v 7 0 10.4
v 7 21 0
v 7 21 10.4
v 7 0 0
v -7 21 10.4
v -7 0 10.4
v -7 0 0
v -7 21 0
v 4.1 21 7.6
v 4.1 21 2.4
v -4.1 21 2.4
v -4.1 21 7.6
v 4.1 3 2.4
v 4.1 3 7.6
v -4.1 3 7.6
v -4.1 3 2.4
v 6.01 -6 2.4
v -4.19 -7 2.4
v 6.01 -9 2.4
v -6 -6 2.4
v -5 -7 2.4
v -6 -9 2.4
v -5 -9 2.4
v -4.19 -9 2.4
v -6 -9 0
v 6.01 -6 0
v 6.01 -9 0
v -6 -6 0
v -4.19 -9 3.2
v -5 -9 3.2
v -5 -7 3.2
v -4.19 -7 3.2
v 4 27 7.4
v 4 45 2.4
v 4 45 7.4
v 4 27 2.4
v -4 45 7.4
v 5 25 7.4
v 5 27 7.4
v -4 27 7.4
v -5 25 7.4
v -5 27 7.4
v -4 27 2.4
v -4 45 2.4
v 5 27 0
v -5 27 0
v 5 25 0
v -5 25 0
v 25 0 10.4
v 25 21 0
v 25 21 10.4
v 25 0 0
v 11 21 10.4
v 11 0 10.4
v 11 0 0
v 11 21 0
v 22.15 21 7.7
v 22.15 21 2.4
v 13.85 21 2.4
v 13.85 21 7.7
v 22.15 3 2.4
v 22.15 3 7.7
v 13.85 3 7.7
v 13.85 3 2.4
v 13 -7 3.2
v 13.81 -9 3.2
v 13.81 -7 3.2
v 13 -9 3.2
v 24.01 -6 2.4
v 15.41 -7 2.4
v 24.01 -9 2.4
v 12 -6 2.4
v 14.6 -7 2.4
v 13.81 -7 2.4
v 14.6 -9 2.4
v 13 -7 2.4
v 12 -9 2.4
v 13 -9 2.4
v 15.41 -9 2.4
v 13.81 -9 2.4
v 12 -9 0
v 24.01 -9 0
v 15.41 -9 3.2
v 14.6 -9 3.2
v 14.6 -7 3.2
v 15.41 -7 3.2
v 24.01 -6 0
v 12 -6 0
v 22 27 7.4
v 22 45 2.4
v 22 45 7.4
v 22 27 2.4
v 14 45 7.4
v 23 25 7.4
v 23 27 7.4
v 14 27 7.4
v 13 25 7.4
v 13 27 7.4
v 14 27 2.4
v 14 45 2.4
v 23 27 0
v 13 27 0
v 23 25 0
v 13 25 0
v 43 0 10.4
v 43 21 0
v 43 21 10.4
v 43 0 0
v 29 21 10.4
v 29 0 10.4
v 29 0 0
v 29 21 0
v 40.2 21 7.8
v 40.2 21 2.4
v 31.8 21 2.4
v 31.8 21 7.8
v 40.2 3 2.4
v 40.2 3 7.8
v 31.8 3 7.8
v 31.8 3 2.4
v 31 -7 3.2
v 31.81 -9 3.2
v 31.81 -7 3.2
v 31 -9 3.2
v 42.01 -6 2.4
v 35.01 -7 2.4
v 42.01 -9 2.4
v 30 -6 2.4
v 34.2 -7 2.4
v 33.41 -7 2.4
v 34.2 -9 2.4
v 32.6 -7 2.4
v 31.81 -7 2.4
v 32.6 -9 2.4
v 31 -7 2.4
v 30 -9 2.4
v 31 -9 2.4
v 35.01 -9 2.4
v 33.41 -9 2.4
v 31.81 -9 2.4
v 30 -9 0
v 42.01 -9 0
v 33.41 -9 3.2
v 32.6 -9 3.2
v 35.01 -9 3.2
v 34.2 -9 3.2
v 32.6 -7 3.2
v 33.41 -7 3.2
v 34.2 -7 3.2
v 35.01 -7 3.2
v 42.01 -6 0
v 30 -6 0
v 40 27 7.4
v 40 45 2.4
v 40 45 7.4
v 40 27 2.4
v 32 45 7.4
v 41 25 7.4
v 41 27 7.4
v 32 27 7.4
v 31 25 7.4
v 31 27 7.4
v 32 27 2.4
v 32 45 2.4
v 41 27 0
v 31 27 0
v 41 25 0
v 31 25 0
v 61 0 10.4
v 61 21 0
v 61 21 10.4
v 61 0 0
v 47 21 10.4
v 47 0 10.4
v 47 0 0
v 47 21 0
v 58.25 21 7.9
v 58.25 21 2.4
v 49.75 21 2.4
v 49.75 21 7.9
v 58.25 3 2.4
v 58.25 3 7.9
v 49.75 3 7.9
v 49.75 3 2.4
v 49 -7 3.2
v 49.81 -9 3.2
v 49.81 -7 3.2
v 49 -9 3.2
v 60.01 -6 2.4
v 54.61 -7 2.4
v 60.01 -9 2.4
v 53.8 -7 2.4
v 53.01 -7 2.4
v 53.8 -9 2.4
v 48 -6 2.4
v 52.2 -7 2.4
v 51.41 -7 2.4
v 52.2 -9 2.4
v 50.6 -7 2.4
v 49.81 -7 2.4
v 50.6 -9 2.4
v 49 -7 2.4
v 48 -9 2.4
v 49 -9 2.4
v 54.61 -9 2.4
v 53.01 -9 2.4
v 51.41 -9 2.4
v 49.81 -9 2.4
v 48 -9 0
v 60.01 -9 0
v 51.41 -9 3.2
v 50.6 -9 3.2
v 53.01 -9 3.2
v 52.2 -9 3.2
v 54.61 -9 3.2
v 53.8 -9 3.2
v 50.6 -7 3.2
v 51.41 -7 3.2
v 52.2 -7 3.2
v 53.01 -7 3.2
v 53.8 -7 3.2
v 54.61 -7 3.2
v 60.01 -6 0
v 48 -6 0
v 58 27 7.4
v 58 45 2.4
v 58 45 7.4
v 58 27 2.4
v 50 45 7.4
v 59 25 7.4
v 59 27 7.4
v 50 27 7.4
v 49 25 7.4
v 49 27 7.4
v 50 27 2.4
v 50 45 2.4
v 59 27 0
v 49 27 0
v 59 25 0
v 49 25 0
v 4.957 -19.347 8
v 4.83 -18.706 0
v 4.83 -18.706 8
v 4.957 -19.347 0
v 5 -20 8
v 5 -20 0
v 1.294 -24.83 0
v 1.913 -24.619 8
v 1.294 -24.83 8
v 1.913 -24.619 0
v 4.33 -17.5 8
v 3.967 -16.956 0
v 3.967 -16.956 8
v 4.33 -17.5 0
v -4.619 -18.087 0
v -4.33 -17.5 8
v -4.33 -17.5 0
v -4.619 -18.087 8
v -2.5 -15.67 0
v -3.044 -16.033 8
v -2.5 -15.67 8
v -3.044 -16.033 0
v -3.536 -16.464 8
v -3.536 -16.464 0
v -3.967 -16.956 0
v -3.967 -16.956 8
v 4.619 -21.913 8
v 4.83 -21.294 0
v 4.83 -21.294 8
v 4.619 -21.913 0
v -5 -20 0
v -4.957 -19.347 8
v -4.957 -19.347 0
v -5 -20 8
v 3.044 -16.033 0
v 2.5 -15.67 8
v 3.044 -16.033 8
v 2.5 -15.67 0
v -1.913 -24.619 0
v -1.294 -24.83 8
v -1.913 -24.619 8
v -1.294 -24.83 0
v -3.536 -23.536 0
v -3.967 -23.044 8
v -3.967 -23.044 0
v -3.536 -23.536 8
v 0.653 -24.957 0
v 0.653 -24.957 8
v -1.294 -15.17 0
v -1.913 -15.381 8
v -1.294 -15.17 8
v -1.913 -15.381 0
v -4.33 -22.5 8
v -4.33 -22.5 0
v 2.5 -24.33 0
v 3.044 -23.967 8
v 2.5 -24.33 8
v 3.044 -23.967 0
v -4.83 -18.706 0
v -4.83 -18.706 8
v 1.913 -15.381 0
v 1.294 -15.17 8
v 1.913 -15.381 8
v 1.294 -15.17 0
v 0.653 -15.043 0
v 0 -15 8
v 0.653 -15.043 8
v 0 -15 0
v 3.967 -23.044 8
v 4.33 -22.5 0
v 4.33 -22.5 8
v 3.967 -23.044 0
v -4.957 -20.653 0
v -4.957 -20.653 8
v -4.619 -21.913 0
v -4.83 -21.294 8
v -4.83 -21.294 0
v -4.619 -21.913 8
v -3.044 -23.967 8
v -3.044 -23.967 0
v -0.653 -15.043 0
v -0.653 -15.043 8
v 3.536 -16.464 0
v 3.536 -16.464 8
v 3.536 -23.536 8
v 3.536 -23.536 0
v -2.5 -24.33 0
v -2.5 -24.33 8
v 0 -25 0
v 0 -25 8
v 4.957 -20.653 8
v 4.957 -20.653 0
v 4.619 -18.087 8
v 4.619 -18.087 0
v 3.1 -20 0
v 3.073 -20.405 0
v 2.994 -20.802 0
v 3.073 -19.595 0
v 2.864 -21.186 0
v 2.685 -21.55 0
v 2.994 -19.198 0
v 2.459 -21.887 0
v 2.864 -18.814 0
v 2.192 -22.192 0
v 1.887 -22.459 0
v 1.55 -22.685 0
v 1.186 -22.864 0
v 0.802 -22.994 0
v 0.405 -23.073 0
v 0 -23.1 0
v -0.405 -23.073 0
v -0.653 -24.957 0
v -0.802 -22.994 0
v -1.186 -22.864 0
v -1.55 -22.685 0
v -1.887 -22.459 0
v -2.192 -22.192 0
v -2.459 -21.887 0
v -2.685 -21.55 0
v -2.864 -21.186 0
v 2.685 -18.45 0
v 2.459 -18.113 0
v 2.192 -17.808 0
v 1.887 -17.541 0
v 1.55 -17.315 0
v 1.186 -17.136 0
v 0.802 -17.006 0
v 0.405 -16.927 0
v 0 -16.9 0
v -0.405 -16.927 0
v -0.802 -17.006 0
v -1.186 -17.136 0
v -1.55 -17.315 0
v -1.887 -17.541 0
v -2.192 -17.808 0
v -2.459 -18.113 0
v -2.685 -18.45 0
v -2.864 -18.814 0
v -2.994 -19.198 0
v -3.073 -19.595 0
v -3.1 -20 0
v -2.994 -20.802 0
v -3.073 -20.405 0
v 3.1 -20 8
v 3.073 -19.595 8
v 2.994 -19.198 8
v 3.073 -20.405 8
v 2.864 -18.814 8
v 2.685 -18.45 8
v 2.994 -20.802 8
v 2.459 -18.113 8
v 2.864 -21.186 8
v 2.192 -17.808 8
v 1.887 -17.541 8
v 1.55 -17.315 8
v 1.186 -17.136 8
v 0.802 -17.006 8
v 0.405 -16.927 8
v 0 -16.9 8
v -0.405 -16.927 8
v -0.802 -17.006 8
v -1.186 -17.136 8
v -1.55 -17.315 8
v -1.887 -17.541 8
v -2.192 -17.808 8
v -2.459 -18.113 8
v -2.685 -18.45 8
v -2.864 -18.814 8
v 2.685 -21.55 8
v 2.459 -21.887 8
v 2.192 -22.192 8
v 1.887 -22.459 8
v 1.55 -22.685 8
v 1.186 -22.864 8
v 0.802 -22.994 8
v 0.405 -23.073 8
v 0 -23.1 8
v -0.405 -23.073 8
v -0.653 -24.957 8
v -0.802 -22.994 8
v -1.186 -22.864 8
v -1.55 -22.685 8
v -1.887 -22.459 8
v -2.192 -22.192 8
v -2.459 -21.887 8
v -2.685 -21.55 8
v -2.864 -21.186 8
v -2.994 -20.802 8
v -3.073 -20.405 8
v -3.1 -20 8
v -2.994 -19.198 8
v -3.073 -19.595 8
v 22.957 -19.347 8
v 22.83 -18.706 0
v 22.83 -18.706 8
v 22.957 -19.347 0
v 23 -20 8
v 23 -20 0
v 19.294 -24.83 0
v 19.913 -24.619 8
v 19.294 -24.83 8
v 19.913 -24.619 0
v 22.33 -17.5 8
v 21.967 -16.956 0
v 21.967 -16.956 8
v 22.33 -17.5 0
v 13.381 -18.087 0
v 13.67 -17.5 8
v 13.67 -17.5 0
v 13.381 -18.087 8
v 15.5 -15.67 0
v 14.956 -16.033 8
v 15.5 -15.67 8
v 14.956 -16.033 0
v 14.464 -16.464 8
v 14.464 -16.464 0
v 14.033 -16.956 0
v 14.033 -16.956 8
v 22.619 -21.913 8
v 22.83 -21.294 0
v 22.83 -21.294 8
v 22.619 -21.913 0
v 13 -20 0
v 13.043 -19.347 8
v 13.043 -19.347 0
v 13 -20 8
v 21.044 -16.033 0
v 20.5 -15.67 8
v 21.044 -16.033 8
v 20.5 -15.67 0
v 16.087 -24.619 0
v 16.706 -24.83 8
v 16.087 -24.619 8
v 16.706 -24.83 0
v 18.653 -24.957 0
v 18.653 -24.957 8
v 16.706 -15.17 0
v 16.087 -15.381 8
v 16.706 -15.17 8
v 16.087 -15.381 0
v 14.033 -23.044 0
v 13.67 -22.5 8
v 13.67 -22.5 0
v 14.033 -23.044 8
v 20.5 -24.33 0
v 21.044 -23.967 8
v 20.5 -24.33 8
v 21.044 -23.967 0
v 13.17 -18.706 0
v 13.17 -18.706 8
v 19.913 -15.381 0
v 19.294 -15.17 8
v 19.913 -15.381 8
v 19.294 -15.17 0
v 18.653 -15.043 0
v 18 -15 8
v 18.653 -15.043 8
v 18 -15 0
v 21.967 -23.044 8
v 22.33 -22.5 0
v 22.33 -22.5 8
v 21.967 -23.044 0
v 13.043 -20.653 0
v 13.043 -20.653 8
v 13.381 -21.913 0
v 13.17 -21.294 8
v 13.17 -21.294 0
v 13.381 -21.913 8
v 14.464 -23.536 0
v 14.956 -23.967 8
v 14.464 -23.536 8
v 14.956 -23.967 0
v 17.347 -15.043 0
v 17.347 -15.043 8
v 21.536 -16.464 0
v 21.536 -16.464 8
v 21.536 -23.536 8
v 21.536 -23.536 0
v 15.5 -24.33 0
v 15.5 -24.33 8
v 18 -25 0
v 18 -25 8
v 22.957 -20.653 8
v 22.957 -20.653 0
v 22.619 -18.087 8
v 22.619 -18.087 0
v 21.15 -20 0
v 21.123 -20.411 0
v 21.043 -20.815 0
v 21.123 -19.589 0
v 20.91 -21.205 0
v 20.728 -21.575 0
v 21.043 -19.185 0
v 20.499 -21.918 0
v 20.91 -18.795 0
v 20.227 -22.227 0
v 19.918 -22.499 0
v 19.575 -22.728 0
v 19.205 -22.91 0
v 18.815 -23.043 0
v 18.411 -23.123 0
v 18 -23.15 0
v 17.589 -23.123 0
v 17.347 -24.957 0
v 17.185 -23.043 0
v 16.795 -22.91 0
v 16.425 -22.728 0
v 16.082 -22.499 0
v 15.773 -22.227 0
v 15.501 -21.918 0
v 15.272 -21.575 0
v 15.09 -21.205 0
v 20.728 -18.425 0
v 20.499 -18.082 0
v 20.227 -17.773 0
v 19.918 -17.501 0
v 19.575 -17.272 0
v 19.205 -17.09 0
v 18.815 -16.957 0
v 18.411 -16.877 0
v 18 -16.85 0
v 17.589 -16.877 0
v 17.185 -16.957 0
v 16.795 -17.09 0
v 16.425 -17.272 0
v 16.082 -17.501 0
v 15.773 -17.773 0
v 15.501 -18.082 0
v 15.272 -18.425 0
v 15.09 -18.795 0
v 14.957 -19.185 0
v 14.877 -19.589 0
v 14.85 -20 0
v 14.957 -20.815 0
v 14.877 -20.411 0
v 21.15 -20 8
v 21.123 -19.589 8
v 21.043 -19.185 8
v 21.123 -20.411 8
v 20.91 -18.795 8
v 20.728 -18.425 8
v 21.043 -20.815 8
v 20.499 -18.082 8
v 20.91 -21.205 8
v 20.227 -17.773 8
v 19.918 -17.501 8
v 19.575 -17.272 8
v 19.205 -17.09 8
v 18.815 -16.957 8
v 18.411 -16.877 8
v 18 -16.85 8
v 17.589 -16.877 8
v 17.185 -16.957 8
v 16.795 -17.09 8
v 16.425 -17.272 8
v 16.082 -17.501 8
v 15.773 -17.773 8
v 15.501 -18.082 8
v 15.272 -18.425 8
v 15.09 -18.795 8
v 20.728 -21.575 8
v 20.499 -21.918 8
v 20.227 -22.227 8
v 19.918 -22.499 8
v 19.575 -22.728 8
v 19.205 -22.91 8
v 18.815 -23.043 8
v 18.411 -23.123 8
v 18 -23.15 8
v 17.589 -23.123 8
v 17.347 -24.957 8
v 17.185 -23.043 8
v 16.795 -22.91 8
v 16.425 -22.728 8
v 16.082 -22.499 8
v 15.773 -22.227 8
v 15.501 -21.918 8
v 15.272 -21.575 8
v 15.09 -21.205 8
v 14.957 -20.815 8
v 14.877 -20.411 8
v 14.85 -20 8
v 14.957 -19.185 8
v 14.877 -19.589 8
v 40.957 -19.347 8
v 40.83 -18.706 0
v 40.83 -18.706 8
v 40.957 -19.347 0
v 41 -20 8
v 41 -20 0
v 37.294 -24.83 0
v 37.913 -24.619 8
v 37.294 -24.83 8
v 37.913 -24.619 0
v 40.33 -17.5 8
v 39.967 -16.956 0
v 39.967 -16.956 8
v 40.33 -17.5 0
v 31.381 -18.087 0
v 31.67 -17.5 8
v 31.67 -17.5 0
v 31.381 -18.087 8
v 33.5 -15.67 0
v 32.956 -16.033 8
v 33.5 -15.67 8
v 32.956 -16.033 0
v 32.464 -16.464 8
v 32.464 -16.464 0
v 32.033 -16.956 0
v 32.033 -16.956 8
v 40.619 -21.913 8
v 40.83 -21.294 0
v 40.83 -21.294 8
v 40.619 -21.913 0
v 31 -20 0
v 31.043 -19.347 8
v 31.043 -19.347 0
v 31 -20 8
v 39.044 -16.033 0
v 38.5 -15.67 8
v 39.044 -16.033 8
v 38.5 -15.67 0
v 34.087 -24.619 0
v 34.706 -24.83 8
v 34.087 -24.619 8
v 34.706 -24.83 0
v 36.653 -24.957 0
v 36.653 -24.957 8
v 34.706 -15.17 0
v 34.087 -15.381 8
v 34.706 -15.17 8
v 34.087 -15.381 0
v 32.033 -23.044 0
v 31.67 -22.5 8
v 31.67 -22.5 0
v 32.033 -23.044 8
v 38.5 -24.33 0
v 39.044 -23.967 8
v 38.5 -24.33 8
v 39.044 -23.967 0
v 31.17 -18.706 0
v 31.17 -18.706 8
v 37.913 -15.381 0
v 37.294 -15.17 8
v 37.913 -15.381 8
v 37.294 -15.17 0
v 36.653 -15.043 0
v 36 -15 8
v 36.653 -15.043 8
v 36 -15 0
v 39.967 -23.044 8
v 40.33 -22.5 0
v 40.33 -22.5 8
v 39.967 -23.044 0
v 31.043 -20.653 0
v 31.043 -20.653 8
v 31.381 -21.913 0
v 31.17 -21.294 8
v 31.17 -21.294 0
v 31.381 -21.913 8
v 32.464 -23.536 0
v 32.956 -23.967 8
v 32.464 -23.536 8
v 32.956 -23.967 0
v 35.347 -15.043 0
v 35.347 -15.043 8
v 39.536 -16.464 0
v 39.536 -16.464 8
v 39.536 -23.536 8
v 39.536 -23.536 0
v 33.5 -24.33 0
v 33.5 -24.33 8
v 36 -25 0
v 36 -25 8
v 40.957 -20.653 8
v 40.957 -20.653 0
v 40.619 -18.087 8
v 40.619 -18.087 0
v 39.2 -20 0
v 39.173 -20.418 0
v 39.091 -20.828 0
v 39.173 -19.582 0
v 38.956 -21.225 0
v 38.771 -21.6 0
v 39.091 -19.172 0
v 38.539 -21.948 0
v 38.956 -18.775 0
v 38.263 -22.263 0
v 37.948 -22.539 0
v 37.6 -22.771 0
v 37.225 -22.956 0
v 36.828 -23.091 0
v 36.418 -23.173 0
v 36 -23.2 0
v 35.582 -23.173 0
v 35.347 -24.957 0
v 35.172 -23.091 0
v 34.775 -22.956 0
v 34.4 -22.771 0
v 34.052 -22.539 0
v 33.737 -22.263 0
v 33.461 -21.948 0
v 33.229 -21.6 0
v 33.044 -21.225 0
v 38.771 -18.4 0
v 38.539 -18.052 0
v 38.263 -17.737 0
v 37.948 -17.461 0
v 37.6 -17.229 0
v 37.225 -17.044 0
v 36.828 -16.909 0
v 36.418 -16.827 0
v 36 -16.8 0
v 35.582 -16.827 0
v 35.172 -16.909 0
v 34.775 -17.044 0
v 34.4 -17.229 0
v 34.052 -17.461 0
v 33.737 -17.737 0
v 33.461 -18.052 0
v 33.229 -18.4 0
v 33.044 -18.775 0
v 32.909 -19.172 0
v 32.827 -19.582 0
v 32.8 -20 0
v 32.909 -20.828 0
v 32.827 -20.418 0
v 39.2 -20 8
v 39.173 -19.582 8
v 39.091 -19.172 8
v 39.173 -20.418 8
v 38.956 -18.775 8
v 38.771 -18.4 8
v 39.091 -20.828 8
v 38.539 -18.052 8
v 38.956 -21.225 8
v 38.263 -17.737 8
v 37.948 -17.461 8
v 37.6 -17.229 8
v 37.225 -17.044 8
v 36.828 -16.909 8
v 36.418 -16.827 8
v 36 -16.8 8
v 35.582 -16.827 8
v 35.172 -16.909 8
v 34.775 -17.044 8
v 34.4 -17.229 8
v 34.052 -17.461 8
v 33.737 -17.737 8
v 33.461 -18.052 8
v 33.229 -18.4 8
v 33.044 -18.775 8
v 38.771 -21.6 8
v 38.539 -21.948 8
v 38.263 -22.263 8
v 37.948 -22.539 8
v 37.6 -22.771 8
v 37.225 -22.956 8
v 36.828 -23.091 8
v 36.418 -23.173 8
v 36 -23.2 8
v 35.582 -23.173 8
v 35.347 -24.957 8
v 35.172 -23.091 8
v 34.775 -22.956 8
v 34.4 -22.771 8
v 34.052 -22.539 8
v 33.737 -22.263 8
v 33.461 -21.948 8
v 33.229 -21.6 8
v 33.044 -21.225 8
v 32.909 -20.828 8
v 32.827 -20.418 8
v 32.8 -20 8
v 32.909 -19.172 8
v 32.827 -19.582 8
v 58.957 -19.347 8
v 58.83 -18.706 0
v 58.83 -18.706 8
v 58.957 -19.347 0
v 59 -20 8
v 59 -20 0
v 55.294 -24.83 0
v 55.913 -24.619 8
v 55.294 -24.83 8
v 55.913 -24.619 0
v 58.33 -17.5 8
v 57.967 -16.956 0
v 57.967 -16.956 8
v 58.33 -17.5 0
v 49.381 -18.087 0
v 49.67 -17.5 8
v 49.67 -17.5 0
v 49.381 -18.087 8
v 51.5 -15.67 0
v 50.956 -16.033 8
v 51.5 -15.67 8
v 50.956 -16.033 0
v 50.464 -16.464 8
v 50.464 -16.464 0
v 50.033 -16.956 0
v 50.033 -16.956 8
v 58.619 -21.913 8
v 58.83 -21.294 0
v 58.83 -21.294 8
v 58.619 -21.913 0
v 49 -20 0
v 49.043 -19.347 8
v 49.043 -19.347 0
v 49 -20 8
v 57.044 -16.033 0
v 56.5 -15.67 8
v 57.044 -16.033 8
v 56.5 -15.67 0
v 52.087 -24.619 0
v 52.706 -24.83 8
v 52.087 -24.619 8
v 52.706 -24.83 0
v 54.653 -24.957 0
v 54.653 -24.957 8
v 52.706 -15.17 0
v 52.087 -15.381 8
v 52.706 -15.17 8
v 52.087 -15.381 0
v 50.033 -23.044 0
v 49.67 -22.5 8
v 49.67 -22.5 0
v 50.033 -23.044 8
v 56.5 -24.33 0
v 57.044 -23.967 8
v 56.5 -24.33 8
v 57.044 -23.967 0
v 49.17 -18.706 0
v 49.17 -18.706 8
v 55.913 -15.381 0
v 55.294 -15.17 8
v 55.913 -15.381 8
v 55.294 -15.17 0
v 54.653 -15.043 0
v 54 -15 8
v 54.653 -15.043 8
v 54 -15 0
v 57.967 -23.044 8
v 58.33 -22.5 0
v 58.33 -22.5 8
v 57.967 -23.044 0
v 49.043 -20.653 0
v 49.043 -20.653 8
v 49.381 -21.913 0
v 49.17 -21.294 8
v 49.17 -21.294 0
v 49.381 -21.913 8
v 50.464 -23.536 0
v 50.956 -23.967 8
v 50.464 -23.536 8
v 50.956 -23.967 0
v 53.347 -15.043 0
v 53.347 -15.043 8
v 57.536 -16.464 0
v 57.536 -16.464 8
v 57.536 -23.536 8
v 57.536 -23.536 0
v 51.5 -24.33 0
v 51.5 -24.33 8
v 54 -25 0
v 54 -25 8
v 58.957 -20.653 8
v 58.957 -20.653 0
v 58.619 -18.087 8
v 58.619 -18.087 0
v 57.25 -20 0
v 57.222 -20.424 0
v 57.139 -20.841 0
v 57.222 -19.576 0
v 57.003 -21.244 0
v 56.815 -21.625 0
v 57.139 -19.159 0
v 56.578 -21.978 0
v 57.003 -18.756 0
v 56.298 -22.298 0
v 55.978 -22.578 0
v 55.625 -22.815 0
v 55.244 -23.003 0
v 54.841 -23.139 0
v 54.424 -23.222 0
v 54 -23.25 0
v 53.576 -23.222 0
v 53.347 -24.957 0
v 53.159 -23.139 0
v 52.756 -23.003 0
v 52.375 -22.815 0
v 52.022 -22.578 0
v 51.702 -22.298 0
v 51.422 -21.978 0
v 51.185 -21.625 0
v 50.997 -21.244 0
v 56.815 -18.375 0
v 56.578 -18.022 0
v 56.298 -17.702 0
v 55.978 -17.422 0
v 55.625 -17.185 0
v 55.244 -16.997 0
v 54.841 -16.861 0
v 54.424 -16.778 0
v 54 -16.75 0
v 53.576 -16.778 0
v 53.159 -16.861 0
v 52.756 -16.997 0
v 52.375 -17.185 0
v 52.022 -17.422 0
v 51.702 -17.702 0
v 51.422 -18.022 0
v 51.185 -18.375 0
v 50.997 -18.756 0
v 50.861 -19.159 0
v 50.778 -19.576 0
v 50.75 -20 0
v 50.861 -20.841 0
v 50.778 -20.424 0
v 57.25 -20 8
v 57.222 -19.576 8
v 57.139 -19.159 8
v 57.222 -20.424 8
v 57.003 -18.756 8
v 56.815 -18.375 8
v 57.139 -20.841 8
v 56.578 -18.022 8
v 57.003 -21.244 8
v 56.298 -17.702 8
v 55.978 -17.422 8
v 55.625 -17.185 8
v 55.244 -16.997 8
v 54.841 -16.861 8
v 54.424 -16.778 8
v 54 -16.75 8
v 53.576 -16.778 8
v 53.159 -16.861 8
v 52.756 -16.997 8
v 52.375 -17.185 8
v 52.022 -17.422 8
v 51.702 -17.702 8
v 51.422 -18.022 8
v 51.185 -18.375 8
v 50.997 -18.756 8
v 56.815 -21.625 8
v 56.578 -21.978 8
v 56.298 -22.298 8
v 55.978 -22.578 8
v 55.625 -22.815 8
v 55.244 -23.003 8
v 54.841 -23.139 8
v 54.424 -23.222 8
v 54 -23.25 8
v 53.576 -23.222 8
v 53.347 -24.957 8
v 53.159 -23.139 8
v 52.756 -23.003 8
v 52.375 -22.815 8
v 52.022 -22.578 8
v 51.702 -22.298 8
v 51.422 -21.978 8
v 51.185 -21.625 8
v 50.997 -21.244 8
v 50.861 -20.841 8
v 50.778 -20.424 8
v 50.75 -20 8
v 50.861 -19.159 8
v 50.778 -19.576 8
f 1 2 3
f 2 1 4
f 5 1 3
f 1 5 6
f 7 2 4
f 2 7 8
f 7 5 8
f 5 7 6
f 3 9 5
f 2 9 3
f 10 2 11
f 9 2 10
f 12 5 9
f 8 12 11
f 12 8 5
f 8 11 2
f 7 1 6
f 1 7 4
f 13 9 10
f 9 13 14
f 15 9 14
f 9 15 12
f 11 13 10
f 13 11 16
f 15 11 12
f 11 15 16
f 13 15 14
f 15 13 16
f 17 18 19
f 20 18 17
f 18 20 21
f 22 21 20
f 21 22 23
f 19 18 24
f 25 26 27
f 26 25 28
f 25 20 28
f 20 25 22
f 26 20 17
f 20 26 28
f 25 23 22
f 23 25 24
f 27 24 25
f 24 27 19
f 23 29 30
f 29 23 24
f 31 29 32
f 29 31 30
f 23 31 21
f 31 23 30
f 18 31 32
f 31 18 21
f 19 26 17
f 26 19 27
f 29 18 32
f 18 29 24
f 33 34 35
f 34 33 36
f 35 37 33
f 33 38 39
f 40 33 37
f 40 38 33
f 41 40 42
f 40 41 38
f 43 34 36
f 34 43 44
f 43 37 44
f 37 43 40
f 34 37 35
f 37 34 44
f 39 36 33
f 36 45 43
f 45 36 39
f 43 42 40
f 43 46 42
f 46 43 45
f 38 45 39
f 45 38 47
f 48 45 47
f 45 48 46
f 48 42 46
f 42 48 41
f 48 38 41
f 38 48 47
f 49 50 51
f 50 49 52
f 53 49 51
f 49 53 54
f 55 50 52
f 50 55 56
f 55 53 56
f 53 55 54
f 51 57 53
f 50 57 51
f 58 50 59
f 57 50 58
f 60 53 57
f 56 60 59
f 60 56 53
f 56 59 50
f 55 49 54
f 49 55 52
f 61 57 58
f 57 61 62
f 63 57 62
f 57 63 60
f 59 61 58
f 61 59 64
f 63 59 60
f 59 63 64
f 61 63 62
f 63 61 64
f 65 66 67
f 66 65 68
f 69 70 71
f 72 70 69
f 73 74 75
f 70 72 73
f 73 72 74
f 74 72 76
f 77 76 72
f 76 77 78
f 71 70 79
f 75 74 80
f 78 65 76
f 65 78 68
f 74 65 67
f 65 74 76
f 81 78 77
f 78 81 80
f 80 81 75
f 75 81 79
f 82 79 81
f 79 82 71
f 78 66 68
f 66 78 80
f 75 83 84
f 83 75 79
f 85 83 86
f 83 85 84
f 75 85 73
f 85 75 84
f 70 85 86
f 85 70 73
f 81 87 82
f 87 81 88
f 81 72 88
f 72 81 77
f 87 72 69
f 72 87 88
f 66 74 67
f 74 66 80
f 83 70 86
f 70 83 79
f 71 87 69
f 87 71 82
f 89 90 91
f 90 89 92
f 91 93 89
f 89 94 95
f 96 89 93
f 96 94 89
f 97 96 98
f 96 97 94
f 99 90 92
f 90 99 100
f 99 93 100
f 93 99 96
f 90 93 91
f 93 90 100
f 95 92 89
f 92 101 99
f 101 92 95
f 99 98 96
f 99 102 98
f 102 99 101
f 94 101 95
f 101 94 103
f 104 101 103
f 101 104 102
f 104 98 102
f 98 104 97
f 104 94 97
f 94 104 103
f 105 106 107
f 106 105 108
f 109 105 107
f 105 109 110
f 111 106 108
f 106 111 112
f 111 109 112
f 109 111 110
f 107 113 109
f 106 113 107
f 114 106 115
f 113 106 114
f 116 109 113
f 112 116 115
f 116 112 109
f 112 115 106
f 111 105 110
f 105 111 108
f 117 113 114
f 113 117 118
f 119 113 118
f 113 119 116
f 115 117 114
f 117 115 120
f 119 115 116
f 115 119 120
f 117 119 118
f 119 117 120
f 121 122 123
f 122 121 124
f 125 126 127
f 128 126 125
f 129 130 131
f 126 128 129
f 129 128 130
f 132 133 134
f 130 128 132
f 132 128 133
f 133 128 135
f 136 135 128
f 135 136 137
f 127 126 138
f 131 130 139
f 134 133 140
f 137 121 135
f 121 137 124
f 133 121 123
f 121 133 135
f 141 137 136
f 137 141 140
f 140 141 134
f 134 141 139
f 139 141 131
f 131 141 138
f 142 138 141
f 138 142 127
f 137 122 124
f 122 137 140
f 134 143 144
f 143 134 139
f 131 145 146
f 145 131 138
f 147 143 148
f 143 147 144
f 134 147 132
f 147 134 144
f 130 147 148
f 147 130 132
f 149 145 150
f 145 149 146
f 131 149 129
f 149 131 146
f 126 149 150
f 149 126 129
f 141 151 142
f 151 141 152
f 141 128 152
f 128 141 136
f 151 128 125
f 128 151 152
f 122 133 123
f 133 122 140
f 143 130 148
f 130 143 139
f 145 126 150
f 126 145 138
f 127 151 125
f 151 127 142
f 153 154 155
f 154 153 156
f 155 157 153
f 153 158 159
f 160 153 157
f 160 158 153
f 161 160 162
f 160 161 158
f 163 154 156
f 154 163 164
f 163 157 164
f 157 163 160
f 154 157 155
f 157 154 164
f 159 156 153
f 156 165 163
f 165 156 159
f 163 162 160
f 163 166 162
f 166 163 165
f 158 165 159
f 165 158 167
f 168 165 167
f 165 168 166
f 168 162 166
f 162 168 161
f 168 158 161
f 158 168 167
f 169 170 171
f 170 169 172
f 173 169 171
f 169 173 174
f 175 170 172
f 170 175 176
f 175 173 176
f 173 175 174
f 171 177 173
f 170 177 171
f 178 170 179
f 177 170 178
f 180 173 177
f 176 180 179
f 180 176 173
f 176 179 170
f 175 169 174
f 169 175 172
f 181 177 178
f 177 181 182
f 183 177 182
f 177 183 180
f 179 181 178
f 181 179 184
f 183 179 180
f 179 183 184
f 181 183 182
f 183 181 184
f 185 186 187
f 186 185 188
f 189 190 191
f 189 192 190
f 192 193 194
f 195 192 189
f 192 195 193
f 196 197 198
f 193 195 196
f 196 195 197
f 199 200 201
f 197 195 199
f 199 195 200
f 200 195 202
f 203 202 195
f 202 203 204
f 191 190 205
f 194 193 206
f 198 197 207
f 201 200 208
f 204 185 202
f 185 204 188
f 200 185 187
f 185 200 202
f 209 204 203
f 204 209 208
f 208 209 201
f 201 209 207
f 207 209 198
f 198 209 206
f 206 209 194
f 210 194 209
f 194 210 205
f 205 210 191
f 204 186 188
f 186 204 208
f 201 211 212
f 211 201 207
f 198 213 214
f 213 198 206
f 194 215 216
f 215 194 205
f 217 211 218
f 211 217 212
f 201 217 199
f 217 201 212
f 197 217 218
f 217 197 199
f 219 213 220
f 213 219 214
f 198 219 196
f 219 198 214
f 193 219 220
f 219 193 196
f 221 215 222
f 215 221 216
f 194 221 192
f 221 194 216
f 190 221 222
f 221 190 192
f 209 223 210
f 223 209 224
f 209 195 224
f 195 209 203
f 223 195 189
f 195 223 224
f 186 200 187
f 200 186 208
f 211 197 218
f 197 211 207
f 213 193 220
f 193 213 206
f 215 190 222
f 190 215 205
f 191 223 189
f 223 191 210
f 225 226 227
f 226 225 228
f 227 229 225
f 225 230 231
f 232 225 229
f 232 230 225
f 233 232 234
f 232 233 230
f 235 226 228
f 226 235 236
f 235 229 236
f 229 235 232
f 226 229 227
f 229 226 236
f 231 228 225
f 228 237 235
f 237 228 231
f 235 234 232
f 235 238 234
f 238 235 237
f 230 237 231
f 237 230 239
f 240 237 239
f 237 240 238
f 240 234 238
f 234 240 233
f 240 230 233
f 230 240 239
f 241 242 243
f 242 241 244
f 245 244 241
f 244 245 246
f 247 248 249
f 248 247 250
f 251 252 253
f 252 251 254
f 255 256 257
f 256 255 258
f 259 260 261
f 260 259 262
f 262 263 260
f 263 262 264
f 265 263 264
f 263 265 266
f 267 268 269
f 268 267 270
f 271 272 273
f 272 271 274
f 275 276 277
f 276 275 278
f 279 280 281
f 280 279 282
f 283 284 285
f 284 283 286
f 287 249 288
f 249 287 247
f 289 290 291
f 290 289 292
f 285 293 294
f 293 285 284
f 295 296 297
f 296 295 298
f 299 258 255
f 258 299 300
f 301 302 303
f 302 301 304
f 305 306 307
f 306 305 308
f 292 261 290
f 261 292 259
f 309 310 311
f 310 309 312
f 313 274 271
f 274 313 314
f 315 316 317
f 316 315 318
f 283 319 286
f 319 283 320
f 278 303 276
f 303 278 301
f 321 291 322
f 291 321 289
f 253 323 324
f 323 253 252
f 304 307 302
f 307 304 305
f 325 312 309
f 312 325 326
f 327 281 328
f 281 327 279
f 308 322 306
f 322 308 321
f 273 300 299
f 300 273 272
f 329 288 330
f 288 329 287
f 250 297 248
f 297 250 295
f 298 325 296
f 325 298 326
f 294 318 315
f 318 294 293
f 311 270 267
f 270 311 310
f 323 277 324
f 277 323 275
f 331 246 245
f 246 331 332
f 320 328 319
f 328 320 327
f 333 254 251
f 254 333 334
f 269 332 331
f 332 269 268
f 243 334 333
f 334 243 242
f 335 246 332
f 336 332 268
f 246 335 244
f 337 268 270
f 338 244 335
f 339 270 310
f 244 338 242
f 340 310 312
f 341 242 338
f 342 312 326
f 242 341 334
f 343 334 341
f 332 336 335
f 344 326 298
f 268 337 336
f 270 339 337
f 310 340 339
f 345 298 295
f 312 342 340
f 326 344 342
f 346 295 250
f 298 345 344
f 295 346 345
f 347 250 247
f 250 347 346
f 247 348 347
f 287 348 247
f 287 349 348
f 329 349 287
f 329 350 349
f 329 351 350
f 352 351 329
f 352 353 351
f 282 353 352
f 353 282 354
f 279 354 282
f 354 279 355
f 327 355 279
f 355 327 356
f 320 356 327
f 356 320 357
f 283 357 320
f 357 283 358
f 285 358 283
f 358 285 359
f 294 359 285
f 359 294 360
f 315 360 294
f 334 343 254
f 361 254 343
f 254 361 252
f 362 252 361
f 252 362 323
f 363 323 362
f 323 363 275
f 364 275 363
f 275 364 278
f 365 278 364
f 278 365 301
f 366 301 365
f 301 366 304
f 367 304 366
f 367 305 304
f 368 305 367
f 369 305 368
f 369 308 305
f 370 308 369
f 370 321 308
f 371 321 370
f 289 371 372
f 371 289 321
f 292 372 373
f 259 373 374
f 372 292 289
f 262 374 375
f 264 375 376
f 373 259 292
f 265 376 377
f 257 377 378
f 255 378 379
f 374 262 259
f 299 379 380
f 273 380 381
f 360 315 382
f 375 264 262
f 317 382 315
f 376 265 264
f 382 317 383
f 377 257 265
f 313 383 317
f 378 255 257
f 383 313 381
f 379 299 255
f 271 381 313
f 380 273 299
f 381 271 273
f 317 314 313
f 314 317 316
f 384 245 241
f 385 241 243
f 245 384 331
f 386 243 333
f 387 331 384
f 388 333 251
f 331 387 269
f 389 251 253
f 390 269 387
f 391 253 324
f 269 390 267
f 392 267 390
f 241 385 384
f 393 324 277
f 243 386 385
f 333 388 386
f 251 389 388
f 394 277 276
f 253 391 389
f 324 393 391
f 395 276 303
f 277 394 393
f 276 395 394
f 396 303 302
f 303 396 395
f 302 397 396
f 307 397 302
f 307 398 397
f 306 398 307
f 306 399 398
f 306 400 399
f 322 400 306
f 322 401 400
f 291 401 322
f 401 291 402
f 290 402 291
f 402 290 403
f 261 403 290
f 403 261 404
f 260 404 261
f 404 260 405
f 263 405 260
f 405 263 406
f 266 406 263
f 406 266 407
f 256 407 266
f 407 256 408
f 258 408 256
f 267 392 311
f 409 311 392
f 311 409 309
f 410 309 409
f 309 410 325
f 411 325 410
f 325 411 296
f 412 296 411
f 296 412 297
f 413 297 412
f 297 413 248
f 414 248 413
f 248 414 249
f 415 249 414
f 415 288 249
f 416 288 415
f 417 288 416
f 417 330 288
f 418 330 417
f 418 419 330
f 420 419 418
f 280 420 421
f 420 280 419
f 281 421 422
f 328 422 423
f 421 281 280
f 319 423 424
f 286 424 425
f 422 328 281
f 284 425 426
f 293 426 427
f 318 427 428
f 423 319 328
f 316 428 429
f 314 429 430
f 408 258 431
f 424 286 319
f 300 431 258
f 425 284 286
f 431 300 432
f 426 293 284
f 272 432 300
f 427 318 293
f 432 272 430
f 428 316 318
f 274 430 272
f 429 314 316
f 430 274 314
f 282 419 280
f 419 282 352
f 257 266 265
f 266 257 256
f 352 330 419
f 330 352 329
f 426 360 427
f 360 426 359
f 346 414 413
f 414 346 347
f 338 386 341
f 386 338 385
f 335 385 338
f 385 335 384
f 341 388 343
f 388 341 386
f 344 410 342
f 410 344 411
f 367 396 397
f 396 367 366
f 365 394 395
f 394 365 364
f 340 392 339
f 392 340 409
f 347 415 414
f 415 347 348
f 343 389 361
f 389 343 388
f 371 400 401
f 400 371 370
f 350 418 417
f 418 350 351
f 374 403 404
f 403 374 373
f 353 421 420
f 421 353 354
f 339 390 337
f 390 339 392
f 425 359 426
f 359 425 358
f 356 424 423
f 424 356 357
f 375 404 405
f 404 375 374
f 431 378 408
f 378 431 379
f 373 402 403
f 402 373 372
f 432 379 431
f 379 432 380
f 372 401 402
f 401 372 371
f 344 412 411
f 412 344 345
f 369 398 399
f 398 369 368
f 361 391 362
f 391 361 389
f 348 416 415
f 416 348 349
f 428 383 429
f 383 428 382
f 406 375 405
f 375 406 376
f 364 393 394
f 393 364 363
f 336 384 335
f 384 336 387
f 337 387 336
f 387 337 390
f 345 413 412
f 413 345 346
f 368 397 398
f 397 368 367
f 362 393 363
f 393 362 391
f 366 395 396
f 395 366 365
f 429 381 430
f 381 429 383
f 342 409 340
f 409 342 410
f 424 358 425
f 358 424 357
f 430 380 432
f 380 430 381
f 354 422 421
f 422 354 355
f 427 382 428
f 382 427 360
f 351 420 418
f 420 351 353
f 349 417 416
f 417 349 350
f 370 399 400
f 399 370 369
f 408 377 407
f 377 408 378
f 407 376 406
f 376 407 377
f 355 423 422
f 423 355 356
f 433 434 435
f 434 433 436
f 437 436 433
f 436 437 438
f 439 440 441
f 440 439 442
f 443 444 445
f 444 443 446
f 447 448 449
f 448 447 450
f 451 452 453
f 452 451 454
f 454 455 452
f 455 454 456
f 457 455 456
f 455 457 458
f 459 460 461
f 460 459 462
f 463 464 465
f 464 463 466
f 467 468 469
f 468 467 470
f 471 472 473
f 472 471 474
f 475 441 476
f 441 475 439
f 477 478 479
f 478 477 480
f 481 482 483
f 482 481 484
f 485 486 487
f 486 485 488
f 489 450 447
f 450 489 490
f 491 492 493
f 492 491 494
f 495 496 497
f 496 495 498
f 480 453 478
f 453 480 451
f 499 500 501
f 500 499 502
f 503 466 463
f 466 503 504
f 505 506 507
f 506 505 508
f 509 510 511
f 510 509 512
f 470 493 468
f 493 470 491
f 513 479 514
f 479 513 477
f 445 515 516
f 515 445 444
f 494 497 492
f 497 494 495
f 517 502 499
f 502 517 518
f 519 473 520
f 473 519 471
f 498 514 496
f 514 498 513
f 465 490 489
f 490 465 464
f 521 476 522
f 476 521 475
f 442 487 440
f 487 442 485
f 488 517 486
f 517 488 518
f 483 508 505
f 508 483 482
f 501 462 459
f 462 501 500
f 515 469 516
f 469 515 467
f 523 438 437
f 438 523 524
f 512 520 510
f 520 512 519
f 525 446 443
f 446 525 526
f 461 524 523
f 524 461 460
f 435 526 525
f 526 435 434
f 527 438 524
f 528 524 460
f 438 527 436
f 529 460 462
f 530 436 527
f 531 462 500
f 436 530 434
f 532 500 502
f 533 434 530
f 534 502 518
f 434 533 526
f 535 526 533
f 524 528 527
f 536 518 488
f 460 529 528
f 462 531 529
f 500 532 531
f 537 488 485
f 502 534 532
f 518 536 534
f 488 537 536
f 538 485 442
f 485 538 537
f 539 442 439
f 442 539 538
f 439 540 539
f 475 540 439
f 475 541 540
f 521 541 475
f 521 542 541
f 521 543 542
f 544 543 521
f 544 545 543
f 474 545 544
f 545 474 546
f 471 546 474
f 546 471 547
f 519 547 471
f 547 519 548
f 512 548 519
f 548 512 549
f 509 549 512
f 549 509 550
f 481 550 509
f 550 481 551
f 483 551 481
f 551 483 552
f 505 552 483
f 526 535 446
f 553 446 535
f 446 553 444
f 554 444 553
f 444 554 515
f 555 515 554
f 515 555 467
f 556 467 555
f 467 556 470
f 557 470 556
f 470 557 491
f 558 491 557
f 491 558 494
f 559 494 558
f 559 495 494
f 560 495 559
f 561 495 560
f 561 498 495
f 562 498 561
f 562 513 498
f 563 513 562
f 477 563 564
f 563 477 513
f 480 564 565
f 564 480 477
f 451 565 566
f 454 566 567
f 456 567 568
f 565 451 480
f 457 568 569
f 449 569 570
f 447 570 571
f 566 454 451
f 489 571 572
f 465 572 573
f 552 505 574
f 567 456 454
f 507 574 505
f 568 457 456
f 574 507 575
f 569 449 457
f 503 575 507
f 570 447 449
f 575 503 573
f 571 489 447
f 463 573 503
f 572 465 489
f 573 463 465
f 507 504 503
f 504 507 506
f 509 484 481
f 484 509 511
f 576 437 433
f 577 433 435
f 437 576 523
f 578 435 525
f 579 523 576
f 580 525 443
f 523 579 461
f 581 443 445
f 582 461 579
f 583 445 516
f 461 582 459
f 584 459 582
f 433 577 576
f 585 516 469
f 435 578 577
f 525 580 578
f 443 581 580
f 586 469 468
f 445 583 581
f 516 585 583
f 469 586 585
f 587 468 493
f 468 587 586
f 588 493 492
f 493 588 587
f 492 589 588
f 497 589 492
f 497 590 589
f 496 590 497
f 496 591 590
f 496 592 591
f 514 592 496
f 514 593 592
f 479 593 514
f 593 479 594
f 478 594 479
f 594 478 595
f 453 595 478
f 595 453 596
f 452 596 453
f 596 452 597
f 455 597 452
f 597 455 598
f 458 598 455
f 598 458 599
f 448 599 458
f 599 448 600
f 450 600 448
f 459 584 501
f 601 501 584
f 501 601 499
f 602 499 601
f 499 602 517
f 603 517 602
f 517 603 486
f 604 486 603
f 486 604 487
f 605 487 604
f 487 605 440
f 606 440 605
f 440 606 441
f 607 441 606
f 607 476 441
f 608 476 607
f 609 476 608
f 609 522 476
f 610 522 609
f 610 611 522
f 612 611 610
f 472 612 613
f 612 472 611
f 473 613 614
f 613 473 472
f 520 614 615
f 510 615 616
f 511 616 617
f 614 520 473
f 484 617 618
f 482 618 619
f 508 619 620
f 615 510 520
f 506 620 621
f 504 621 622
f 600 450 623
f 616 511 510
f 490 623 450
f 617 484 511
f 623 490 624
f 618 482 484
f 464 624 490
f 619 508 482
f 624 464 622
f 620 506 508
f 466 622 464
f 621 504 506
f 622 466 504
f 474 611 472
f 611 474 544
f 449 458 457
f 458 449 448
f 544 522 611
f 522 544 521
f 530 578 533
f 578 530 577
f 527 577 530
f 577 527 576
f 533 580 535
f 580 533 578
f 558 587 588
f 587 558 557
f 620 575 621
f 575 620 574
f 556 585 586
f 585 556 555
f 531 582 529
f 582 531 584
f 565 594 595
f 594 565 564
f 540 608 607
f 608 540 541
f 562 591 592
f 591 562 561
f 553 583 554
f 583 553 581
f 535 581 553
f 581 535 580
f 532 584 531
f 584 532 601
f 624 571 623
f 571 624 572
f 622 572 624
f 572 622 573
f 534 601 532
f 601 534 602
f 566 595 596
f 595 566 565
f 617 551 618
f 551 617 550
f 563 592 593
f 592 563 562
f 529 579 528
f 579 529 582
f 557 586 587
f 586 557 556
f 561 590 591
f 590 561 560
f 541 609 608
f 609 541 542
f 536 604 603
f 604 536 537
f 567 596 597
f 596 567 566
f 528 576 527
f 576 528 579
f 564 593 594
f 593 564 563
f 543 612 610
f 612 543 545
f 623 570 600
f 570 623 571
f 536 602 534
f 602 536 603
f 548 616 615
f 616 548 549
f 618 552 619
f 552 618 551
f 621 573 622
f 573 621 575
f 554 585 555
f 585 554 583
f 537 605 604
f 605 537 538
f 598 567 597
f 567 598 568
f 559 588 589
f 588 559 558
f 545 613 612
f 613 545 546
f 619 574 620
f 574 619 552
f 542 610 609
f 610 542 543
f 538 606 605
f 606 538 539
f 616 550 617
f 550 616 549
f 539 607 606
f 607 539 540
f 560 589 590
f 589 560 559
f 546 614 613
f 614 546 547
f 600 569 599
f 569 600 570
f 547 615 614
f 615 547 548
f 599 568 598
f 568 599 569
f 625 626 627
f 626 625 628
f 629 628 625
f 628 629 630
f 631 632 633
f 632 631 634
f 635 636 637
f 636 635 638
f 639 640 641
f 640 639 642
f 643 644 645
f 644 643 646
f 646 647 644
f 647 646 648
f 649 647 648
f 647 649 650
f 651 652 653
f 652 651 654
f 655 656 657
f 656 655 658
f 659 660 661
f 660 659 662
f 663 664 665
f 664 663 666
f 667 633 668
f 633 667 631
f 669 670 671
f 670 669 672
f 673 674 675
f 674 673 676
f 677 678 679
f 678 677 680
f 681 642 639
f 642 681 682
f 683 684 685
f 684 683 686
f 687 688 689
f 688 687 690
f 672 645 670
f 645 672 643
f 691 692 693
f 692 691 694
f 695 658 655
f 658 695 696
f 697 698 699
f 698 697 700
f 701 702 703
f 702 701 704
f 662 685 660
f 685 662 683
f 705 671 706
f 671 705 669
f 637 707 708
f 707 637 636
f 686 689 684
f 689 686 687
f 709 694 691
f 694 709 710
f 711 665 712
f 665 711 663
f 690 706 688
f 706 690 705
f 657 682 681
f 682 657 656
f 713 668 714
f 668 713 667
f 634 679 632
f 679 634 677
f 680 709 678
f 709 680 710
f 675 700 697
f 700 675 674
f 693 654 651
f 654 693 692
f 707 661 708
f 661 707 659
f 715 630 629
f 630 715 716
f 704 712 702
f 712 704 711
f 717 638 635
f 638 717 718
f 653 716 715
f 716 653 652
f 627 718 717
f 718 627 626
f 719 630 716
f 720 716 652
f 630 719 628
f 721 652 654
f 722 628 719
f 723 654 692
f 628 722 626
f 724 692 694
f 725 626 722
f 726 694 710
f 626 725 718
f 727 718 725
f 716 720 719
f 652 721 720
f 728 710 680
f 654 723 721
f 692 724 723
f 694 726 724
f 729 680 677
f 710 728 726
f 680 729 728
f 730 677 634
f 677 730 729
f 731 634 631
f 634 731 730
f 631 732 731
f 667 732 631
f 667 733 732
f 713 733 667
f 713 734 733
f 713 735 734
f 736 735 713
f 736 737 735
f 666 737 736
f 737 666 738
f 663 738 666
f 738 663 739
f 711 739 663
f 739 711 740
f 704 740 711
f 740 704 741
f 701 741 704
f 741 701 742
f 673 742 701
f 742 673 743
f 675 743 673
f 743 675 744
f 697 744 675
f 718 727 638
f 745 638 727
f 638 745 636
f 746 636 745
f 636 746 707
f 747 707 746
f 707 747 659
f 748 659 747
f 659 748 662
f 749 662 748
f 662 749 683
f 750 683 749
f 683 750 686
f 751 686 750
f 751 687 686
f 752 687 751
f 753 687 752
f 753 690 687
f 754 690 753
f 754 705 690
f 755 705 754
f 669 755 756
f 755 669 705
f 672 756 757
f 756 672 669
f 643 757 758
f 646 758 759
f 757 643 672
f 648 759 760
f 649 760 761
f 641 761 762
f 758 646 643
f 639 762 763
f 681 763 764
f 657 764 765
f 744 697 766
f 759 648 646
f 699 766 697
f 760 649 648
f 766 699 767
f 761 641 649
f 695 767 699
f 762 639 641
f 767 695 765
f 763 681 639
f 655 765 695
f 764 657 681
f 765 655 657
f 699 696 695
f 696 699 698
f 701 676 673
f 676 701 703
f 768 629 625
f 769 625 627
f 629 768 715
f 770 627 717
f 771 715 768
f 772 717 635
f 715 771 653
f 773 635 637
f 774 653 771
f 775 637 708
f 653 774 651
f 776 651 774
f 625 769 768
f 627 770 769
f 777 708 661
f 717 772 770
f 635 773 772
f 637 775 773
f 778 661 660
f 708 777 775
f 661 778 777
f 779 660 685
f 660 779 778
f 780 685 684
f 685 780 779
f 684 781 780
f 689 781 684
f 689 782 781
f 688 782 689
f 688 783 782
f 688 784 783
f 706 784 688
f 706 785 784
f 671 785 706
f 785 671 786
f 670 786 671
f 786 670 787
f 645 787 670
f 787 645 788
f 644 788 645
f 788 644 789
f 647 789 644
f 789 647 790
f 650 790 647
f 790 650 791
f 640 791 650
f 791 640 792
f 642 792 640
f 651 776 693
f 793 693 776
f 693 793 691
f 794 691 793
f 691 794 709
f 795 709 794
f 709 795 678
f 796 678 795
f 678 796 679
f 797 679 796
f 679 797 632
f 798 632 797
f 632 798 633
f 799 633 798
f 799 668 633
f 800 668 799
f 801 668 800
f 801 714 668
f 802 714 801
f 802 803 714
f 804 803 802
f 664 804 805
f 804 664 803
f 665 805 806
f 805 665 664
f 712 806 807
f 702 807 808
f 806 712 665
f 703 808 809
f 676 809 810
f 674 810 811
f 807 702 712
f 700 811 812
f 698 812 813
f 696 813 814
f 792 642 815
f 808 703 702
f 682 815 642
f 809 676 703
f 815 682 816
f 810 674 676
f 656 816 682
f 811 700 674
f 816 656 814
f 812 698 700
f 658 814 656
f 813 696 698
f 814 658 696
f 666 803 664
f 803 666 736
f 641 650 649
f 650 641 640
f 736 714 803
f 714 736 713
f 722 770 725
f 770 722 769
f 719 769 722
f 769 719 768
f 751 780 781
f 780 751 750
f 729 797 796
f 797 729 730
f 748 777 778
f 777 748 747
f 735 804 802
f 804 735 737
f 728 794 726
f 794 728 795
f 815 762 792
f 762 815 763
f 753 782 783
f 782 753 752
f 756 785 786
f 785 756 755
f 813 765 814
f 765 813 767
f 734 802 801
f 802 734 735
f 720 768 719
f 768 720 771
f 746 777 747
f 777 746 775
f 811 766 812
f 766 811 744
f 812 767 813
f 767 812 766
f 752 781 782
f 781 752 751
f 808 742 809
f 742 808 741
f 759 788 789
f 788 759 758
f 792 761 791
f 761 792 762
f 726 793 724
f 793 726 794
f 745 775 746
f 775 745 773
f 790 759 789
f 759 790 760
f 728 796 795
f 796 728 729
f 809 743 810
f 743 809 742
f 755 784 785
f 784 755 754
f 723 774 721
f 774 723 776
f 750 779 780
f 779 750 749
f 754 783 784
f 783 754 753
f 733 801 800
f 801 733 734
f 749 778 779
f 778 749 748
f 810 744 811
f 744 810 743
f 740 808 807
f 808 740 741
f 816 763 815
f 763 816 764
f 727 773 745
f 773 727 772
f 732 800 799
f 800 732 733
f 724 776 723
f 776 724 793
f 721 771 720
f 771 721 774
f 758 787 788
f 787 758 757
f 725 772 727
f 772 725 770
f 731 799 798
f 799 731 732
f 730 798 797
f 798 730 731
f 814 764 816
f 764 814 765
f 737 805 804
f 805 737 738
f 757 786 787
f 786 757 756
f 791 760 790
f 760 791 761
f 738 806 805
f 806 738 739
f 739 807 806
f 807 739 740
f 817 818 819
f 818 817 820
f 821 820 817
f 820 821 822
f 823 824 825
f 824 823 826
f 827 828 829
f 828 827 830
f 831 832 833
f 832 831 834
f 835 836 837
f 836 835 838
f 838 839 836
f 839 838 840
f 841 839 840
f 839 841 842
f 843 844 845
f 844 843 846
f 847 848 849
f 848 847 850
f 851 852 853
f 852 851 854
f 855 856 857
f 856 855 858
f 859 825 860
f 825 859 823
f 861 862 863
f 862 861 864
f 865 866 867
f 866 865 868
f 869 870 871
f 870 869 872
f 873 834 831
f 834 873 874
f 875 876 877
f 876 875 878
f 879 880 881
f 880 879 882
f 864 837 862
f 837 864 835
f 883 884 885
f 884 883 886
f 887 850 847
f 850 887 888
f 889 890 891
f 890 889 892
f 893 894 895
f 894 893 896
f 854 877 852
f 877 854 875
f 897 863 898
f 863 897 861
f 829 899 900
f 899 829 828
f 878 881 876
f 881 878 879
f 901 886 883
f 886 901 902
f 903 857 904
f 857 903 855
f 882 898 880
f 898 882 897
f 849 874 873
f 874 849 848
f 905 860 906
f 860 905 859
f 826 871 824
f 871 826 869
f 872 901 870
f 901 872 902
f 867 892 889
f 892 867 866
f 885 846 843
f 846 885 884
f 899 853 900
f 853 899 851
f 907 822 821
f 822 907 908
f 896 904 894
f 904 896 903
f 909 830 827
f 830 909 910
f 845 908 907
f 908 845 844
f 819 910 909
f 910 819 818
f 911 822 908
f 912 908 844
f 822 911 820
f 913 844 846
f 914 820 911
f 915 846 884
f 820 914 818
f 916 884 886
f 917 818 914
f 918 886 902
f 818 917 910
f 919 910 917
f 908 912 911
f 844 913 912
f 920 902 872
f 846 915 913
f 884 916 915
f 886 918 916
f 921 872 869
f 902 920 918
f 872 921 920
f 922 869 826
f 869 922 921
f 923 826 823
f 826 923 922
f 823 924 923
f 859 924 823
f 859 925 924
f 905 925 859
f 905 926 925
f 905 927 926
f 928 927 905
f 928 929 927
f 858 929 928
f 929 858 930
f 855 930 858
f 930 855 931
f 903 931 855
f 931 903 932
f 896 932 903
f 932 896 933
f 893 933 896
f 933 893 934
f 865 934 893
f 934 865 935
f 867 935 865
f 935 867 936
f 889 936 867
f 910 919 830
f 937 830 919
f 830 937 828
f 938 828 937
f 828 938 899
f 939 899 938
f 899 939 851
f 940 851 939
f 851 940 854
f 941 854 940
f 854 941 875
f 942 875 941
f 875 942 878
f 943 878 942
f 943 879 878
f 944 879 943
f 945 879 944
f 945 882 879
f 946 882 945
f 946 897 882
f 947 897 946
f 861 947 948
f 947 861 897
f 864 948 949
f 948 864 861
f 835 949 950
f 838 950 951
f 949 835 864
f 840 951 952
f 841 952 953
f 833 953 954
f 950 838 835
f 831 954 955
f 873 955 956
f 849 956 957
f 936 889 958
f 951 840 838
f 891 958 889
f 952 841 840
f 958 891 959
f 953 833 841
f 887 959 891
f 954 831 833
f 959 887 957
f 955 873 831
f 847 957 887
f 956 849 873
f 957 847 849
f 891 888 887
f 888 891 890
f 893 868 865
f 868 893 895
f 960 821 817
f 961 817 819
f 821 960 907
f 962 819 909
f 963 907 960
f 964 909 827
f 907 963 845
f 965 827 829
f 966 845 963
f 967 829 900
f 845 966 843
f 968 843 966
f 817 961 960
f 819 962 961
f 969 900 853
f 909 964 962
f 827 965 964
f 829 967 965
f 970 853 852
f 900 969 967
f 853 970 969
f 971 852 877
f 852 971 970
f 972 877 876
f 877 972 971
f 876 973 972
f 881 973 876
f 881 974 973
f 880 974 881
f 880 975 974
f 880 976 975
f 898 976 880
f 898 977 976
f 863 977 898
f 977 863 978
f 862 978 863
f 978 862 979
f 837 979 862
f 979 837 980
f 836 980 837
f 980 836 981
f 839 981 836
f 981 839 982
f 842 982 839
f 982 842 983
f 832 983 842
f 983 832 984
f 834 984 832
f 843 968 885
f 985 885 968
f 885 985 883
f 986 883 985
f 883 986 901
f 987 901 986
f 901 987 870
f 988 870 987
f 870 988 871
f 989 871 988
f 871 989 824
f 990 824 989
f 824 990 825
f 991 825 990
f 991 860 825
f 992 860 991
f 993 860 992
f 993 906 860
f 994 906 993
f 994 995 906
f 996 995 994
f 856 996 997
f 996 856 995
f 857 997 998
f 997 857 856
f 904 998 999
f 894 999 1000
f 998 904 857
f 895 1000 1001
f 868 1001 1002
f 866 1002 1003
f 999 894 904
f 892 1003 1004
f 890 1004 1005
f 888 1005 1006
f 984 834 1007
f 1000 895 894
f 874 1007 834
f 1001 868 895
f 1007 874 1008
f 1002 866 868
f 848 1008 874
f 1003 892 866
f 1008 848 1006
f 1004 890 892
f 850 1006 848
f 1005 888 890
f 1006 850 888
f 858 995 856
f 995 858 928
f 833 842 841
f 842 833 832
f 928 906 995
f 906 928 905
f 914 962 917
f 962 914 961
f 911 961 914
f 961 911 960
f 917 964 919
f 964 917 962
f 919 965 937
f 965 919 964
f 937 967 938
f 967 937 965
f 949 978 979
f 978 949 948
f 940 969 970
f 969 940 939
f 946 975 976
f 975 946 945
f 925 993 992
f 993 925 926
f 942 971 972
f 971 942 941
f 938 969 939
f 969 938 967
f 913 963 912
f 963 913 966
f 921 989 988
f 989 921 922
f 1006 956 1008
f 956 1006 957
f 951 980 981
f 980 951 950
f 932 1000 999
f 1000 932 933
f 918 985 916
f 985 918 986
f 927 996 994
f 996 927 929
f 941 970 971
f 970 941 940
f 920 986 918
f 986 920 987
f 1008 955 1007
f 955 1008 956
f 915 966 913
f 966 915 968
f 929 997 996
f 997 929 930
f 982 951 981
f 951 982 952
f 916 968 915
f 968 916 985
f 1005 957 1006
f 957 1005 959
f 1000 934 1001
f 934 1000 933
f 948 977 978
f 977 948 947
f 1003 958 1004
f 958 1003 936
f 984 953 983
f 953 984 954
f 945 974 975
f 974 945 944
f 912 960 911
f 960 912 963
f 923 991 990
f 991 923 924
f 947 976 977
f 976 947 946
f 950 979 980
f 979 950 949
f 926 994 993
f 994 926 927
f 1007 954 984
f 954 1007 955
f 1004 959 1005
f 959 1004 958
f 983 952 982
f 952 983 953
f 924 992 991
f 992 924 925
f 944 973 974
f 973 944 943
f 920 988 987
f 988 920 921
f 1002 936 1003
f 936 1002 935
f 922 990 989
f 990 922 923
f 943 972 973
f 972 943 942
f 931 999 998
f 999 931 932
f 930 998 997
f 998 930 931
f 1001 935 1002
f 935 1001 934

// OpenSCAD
// F-14 RC v75 joint clearance coupon - P2S / 0.4 mm nozzle
// Measures real sliding/adhesive fit at 0.10, 0.15, 0.20, 0.25 mm per-side clearance.
$fn=48;
clearances=[0.10,0.15,0.20,0.25];
peg_w=8; peg_h=5; peg_len=18; wall=3; base=2.4; pitch=18;

module label_bar(x,c){
    translate([x-6,-9,0]) cube([12,3,base]);
    // physical notch code: 1..4 notches identifies clearance without relying on embossed text
    for(n=[0:round(c*20)-2]) translate([x-5+n*1.6,-9,base]) cube([0.8,2,0.8]);
}
module socket(x,c){
    difference(){
        translate([x-(peg_w+2*wall)/2,0,0]) cube([peg_w+2*wall,peg_len+wall,peg_h+base+wall]);
        translate([x-peg_w/2-c,wall,base]) cube([peg_w+2*c,peg_len+0.2,peg_h+2*c]);
    }
    label_bar(x,c);
}
module peg(x,c){
    translate([x-peg_w/2,27,base]) cube([peg_w,peg_len,peg_h]);
    translate([x-peg_w/2-1,25,0]) cube([peg_w+2,2,base+peg_h]);
    label_bar(x+0.01,c);
}
for(i=[0:3]){
    x=i*pitch;
    socket(x,clearances[i]);
    peg(x,clearances[i]);
}
// 6 mm carbon-like rod gauge with radial holes for 0.10..0.25 mm clearance
for(i=[0:3]){
    x=i*pitch;
    translate([x,-20,0]) difference(){
        cylinder(h=8,r=5);
        translate([0,0,-0.1]) cylinder(h=8.2,r=3+clearances[i]);
    }
}
